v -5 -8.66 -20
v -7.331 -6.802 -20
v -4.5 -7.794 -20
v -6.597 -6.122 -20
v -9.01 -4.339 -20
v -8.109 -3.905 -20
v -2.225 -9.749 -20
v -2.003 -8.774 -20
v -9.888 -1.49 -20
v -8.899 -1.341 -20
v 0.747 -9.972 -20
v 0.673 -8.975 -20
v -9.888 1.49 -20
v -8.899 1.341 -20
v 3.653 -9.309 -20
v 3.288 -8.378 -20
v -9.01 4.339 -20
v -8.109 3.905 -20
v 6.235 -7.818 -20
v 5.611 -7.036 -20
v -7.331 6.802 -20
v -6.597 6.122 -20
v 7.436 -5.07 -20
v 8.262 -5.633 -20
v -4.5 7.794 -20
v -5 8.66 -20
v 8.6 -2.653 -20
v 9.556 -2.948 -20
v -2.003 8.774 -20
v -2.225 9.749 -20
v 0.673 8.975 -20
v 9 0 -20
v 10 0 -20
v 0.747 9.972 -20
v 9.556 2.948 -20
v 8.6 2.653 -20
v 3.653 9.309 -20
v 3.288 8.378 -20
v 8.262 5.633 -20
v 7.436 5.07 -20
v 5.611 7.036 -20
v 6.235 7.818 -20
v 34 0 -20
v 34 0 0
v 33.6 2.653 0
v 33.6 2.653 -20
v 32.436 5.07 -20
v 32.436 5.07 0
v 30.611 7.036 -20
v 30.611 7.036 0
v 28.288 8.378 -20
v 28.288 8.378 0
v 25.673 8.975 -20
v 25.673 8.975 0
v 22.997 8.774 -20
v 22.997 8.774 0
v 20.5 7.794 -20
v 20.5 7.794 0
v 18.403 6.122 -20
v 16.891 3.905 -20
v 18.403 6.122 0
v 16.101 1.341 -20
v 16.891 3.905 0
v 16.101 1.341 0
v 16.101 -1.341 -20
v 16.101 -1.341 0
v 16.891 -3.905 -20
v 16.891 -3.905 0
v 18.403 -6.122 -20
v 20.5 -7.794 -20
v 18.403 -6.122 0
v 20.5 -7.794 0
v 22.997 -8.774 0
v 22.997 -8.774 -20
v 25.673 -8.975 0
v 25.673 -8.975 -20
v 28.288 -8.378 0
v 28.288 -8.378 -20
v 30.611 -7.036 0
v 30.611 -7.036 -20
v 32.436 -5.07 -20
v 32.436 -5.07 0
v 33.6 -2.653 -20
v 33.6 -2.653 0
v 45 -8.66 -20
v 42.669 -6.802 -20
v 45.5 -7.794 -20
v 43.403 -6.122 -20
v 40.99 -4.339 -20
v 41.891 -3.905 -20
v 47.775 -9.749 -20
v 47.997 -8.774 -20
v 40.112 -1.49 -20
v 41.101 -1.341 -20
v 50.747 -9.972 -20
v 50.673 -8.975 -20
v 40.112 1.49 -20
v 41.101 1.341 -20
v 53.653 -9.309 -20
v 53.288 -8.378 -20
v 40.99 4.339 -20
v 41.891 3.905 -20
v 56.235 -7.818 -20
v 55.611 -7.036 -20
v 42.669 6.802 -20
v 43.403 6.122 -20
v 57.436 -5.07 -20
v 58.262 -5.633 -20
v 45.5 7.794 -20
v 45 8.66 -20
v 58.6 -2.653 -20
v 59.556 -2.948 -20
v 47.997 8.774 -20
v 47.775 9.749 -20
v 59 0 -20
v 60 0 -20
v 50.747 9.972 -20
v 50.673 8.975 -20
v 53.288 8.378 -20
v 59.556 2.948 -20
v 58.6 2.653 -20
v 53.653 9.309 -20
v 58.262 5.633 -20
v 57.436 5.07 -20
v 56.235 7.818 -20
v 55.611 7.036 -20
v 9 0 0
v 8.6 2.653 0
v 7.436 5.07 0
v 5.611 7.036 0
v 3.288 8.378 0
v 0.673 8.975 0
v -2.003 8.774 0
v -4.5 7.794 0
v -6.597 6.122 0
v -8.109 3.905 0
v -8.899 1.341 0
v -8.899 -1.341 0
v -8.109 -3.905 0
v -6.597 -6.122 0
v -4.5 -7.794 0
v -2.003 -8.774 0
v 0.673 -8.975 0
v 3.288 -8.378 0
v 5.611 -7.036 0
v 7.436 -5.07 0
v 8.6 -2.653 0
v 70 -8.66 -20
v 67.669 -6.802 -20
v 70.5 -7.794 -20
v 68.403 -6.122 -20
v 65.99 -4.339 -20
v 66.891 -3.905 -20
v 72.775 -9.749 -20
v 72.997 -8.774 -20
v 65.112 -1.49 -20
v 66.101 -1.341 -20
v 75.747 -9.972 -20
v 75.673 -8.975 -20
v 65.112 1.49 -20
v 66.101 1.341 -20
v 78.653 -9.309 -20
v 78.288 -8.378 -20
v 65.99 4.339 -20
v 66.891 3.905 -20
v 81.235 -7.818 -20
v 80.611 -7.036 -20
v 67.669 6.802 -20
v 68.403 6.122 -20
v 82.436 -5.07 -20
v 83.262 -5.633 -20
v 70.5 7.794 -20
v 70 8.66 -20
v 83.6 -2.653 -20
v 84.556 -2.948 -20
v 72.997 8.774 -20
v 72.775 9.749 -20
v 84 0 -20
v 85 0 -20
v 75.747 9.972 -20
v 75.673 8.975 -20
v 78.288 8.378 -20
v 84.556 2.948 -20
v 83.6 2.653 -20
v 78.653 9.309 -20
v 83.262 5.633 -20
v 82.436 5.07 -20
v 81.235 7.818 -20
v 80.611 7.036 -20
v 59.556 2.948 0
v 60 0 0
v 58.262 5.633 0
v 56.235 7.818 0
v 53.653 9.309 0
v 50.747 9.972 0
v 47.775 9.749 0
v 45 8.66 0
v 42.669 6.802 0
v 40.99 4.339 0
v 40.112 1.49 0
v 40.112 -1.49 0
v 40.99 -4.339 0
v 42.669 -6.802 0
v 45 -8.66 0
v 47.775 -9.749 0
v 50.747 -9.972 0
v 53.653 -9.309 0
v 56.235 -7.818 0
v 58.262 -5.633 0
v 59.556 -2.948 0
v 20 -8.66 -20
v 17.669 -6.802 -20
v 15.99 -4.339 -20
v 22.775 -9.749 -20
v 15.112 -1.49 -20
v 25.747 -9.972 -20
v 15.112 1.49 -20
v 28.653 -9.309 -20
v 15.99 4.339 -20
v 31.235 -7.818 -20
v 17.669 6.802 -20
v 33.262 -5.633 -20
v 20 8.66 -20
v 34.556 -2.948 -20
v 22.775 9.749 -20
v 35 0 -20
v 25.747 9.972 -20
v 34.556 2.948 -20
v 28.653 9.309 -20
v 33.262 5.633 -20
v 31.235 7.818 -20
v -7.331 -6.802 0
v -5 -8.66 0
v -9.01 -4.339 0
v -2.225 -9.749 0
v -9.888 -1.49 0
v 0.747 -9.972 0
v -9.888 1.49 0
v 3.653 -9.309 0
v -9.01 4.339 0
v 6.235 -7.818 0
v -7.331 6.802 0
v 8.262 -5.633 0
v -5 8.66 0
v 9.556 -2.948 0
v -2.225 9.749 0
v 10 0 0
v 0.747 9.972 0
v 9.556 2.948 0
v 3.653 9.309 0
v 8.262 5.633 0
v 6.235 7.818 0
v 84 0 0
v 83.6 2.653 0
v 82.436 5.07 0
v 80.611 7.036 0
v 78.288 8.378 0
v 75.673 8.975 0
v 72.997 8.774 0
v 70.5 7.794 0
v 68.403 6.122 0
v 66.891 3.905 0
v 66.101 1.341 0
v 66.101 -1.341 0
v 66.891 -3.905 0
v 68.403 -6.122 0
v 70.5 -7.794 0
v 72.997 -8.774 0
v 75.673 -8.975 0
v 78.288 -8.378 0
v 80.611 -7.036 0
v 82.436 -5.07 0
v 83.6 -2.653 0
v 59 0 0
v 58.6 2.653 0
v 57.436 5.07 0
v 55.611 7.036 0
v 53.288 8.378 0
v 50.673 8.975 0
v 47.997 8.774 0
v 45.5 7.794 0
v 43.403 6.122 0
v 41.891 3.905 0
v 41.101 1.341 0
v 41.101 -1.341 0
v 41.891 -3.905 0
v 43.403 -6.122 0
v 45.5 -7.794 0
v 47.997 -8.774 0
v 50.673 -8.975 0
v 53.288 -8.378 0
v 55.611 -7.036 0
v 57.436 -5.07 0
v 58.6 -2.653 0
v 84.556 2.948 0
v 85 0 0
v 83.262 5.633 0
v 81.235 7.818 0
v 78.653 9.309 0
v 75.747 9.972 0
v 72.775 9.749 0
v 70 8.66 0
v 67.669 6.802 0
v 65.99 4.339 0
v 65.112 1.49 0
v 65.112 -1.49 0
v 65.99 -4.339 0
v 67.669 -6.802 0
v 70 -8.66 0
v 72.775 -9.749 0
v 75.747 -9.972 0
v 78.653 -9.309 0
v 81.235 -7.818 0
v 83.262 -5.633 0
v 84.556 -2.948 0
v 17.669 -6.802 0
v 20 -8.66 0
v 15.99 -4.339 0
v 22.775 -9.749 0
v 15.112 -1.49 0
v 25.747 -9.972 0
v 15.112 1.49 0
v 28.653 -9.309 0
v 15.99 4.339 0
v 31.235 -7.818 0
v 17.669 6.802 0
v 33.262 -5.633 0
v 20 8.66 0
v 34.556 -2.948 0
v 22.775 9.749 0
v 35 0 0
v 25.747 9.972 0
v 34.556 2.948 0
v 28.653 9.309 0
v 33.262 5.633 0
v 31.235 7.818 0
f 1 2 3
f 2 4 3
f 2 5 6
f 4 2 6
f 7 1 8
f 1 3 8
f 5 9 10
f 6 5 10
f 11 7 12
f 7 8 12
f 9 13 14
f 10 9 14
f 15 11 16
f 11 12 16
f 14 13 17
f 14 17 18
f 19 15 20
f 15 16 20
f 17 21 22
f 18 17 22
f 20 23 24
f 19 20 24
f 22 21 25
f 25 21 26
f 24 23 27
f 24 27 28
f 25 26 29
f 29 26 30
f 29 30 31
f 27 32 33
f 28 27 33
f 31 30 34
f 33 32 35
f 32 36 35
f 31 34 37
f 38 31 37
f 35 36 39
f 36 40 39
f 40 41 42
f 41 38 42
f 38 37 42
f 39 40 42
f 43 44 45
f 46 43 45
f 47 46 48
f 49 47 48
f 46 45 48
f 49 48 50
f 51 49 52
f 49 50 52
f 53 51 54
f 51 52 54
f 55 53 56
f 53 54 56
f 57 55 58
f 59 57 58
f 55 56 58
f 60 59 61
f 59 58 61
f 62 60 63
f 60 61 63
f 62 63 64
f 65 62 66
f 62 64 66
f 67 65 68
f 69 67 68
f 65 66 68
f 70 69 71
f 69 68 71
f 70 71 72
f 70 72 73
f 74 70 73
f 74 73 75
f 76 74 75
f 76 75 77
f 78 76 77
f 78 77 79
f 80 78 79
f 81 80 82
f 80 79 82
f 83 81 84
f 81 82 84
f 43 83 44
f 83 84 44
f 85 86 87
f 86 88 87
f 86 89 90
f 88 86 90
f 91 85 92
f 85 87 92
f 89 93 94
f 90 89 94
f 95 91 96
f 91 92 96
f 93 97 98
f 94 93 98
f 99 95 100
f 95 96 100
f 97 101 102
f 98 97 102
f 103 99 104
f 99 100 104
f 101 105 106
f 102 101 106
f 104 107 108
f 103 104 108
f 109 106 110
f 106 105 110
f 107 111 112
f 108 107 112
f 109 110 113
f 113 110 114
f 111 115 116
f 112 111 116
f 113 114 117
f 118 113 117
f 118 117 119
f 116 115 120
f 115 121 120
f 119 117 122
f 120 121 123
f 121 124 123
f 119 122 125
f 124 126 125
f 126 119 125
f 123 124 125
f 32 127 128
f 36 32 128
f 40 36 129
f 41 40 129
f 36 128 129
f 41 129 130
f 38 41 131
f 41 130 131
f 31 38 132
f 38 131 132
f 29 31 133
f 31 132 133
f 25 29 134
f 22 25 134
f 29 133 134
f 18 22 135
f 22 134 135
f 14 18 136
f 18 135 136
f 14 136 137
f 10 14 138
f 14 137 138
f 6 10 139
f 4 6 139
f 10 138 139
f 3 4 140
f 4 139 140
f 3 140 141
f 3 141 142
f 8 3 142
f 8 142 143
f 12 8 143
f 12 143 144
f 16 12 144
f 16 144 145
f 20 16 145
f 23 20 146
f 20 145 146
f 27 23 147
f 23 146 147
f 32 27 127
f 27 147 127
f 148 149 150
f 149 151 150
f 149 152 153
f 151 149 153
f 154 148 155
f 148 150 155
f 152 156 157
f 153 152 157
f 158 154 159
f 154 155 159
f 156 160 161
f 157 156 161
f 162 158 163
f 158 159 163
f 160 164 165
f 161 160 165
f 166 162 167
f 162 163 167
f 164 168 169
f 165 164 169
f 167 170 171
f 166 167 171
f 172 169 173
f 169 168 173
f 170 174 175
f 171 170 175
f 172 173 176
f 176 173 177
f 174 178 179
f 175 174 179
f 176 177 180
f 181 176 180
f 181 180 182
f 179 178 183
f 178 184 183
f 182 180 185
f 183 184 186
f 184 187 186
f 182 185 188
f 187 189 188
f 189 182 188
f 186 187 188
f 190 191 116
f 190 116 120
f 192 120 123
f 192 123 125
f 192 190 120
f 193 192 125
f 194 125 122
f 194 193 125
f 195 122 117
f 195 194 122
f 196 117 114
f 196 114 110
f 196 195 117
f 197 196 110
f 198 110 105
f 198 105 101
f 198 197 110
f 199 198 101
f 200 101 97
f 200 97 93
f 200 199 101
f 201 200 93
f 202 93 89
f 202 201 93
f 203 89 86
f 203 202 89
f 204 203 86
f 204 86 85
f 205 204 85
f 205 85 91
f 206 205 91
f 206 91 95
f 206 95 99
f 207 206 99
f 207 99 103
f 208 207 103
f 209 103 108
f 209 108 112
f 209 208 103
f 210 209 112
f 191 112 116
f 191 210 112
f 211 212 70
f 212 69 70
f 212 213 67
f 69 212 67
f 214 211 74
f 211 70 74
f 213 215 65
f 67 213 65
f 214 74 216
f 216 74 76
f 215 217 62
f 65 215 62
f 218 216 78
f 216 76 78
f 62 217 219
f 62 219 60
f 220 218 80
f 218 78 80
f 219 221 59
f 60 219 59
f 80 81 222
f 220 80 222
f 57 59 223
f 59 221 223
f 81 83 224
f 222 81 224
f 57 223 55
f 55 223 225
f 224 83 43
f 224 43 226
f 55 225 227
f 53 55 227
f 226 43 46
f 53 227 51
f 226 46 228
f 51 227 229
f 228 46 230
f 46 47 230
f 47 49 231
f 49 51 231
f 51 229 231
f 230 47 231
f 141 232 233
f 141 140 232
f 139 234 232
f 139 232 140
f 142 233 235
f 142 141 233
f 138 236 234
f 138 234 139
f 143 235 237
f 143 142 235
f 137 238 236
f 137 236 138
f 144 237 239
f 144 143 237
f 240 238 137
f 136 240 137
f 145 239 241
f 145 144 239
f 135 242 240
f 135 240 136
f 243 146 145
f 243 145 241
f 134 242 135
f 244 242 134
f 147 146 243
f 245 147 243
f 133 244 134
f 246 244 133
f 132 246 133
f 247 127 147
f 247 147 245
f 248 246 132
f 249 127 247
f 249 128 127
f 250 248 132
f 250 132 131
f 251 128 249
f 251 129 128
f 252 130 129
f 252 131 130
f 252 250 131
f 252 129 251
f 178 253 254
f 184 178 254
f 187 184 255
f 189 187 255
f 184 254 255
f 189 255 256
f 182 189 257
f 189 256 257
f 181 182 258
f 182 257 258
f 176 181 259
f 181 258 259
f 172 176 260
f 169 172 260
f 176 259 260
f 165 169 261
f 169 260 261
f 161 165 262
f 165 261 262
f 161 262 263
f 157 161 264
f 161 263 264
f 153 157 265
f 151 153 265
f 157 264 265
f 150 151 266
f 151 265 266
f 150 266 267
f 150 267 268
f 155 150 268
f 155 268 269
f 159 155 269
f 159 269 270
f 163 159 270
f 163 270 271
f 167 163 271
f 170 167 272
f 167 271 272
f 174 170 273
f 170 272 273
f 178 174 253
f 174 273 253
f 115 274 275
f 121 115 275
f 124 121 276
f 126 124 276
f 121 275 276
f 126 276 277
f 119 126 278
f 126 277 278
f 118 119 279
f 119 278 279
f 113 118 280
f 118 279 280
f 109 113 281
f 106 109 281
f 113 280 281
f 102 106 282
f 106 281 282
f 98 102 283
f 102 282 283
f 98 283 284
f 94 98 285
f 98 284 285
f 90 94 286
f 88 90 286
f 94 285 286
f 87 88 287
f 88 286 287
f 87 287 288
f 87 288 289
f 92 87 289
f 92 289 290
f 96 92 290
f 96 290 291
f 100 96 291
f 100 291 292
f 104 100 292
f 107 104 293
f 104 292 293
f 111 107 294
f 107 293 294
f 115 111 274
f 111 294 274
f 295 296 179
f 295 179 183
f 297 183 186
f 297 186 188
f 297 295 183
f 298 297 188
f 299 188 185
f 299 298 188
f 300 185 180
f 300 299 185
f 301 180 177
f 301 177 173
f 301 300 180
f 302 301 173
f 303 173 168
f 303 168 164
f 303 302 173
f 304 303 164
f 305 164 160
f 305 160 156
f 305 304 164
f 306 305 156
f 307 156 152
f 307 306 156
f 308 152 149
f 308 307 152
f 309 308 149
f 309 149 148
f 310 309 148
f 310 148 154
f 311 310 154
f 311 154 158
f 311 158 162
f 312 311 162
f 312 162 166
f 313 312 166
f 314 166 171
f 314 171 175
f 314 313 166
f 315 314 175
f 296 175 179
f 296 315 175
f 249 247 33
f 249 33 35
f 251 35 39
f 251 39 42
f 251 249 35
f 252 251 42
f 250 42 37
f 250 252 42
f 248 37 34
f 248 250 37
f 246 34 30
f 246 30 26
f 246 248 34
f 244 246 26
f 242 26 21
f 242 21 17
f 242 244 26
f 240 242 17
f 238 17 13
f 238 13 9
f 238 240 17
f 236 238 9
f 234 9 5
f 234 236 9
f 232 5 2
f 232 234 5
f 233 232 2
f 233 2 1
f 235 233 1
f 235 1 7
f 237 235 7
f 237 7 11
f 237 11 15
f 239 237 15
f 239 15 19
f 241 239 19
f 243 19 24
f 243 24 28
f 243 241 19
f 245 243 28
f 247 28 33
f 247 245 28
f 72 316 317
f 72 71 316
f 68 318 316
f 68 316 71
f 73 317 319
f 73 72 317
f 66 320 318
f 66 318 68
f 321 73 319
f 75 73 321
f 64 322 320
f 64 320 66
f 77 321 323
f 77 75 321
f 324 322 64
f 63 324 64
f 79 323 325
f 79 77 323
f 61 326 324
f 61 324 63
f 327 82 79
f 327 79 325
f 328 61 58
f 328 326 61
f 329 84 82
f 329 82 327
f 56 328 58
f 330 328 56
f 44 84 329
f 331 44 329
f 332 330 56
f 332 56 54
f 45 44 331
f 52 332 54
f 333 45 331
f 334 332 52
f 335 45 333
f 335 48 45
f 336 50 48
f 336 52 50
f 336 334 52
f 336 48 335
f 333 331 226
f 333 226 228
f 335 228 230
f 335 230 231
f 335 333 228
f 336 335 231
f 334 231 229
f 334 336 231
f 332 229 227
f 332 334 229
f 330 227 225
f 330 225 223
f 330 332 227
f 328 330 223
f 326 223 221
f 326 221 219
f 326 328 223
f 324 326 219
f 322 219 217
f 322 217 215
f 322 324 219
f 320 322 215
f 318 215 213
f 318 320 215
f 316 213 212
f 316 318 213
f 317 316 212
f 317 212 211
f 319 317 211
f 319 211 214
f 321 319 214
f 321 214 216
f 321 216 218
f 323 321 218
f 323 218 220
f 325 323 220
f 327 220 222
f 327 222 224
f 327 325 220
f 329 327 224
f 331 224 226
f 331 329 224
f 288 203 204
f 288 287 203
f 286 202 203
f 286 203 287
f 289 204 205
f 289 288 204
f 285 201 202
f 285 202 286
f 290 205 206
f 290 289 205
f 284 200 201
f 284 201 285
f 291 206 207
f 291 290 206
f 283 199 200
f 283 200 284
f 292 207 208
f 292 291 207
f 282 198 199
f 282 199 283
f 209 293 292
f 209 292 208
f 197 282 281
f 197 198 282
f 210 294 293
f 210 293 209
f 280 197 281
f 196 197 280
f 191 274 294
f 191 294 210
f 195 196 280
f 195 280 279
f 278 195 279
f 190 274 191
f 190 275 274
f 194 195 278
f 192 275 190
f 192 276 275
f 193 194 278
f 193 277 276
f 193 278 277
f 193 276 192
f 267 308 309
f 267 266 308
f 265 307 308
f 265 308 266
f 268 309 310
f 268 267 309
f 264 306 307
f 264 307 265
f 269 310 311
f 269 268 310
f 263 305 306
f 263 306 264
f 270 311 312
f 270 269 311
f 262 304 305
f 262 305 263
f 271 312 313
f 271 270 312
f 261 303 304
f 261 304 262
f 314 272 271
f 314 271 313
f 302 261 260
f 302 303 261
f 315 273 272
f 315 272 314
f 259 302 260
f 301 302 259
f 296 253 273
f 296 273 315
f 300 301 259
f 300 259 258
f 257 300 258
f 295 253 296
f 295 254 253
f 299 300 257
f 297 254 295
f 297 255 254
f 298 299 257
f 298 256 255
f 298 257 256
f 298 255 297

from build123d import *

# Parameters (mm, degrees)
F0_R     = 10
F0_R_2   = 9
F1_DEPTH = 20


with BuildPart() as f1:
    # F0 (on Top) → F1 (new body)
    with BuildSketch(Plane.XY):
        Circle(F0_R)
        Circle(F0_R_2, mode=Mode.SUBTRACT)
        with Locations((25, 0)):
            Circle(F0_R)
        with Locations((25, 0)):
            Circle(F0_R_2, mode=Mode.SUBTRACT)
        with Locations((50, 0)):
            Circle(F0_R)
        with Locations((50, 0)):
            Circle(F0_R_2, mode=Mode.SUBTRACT)
        with Locations((75, 0)):
            Circle(F0_R)
        with Locations((75, 0)):
            Circle(F0_R_2, mode=Mode.SUBTRACT)
    extrude(amount=-F1_DEPTH)


solid = f1.part
